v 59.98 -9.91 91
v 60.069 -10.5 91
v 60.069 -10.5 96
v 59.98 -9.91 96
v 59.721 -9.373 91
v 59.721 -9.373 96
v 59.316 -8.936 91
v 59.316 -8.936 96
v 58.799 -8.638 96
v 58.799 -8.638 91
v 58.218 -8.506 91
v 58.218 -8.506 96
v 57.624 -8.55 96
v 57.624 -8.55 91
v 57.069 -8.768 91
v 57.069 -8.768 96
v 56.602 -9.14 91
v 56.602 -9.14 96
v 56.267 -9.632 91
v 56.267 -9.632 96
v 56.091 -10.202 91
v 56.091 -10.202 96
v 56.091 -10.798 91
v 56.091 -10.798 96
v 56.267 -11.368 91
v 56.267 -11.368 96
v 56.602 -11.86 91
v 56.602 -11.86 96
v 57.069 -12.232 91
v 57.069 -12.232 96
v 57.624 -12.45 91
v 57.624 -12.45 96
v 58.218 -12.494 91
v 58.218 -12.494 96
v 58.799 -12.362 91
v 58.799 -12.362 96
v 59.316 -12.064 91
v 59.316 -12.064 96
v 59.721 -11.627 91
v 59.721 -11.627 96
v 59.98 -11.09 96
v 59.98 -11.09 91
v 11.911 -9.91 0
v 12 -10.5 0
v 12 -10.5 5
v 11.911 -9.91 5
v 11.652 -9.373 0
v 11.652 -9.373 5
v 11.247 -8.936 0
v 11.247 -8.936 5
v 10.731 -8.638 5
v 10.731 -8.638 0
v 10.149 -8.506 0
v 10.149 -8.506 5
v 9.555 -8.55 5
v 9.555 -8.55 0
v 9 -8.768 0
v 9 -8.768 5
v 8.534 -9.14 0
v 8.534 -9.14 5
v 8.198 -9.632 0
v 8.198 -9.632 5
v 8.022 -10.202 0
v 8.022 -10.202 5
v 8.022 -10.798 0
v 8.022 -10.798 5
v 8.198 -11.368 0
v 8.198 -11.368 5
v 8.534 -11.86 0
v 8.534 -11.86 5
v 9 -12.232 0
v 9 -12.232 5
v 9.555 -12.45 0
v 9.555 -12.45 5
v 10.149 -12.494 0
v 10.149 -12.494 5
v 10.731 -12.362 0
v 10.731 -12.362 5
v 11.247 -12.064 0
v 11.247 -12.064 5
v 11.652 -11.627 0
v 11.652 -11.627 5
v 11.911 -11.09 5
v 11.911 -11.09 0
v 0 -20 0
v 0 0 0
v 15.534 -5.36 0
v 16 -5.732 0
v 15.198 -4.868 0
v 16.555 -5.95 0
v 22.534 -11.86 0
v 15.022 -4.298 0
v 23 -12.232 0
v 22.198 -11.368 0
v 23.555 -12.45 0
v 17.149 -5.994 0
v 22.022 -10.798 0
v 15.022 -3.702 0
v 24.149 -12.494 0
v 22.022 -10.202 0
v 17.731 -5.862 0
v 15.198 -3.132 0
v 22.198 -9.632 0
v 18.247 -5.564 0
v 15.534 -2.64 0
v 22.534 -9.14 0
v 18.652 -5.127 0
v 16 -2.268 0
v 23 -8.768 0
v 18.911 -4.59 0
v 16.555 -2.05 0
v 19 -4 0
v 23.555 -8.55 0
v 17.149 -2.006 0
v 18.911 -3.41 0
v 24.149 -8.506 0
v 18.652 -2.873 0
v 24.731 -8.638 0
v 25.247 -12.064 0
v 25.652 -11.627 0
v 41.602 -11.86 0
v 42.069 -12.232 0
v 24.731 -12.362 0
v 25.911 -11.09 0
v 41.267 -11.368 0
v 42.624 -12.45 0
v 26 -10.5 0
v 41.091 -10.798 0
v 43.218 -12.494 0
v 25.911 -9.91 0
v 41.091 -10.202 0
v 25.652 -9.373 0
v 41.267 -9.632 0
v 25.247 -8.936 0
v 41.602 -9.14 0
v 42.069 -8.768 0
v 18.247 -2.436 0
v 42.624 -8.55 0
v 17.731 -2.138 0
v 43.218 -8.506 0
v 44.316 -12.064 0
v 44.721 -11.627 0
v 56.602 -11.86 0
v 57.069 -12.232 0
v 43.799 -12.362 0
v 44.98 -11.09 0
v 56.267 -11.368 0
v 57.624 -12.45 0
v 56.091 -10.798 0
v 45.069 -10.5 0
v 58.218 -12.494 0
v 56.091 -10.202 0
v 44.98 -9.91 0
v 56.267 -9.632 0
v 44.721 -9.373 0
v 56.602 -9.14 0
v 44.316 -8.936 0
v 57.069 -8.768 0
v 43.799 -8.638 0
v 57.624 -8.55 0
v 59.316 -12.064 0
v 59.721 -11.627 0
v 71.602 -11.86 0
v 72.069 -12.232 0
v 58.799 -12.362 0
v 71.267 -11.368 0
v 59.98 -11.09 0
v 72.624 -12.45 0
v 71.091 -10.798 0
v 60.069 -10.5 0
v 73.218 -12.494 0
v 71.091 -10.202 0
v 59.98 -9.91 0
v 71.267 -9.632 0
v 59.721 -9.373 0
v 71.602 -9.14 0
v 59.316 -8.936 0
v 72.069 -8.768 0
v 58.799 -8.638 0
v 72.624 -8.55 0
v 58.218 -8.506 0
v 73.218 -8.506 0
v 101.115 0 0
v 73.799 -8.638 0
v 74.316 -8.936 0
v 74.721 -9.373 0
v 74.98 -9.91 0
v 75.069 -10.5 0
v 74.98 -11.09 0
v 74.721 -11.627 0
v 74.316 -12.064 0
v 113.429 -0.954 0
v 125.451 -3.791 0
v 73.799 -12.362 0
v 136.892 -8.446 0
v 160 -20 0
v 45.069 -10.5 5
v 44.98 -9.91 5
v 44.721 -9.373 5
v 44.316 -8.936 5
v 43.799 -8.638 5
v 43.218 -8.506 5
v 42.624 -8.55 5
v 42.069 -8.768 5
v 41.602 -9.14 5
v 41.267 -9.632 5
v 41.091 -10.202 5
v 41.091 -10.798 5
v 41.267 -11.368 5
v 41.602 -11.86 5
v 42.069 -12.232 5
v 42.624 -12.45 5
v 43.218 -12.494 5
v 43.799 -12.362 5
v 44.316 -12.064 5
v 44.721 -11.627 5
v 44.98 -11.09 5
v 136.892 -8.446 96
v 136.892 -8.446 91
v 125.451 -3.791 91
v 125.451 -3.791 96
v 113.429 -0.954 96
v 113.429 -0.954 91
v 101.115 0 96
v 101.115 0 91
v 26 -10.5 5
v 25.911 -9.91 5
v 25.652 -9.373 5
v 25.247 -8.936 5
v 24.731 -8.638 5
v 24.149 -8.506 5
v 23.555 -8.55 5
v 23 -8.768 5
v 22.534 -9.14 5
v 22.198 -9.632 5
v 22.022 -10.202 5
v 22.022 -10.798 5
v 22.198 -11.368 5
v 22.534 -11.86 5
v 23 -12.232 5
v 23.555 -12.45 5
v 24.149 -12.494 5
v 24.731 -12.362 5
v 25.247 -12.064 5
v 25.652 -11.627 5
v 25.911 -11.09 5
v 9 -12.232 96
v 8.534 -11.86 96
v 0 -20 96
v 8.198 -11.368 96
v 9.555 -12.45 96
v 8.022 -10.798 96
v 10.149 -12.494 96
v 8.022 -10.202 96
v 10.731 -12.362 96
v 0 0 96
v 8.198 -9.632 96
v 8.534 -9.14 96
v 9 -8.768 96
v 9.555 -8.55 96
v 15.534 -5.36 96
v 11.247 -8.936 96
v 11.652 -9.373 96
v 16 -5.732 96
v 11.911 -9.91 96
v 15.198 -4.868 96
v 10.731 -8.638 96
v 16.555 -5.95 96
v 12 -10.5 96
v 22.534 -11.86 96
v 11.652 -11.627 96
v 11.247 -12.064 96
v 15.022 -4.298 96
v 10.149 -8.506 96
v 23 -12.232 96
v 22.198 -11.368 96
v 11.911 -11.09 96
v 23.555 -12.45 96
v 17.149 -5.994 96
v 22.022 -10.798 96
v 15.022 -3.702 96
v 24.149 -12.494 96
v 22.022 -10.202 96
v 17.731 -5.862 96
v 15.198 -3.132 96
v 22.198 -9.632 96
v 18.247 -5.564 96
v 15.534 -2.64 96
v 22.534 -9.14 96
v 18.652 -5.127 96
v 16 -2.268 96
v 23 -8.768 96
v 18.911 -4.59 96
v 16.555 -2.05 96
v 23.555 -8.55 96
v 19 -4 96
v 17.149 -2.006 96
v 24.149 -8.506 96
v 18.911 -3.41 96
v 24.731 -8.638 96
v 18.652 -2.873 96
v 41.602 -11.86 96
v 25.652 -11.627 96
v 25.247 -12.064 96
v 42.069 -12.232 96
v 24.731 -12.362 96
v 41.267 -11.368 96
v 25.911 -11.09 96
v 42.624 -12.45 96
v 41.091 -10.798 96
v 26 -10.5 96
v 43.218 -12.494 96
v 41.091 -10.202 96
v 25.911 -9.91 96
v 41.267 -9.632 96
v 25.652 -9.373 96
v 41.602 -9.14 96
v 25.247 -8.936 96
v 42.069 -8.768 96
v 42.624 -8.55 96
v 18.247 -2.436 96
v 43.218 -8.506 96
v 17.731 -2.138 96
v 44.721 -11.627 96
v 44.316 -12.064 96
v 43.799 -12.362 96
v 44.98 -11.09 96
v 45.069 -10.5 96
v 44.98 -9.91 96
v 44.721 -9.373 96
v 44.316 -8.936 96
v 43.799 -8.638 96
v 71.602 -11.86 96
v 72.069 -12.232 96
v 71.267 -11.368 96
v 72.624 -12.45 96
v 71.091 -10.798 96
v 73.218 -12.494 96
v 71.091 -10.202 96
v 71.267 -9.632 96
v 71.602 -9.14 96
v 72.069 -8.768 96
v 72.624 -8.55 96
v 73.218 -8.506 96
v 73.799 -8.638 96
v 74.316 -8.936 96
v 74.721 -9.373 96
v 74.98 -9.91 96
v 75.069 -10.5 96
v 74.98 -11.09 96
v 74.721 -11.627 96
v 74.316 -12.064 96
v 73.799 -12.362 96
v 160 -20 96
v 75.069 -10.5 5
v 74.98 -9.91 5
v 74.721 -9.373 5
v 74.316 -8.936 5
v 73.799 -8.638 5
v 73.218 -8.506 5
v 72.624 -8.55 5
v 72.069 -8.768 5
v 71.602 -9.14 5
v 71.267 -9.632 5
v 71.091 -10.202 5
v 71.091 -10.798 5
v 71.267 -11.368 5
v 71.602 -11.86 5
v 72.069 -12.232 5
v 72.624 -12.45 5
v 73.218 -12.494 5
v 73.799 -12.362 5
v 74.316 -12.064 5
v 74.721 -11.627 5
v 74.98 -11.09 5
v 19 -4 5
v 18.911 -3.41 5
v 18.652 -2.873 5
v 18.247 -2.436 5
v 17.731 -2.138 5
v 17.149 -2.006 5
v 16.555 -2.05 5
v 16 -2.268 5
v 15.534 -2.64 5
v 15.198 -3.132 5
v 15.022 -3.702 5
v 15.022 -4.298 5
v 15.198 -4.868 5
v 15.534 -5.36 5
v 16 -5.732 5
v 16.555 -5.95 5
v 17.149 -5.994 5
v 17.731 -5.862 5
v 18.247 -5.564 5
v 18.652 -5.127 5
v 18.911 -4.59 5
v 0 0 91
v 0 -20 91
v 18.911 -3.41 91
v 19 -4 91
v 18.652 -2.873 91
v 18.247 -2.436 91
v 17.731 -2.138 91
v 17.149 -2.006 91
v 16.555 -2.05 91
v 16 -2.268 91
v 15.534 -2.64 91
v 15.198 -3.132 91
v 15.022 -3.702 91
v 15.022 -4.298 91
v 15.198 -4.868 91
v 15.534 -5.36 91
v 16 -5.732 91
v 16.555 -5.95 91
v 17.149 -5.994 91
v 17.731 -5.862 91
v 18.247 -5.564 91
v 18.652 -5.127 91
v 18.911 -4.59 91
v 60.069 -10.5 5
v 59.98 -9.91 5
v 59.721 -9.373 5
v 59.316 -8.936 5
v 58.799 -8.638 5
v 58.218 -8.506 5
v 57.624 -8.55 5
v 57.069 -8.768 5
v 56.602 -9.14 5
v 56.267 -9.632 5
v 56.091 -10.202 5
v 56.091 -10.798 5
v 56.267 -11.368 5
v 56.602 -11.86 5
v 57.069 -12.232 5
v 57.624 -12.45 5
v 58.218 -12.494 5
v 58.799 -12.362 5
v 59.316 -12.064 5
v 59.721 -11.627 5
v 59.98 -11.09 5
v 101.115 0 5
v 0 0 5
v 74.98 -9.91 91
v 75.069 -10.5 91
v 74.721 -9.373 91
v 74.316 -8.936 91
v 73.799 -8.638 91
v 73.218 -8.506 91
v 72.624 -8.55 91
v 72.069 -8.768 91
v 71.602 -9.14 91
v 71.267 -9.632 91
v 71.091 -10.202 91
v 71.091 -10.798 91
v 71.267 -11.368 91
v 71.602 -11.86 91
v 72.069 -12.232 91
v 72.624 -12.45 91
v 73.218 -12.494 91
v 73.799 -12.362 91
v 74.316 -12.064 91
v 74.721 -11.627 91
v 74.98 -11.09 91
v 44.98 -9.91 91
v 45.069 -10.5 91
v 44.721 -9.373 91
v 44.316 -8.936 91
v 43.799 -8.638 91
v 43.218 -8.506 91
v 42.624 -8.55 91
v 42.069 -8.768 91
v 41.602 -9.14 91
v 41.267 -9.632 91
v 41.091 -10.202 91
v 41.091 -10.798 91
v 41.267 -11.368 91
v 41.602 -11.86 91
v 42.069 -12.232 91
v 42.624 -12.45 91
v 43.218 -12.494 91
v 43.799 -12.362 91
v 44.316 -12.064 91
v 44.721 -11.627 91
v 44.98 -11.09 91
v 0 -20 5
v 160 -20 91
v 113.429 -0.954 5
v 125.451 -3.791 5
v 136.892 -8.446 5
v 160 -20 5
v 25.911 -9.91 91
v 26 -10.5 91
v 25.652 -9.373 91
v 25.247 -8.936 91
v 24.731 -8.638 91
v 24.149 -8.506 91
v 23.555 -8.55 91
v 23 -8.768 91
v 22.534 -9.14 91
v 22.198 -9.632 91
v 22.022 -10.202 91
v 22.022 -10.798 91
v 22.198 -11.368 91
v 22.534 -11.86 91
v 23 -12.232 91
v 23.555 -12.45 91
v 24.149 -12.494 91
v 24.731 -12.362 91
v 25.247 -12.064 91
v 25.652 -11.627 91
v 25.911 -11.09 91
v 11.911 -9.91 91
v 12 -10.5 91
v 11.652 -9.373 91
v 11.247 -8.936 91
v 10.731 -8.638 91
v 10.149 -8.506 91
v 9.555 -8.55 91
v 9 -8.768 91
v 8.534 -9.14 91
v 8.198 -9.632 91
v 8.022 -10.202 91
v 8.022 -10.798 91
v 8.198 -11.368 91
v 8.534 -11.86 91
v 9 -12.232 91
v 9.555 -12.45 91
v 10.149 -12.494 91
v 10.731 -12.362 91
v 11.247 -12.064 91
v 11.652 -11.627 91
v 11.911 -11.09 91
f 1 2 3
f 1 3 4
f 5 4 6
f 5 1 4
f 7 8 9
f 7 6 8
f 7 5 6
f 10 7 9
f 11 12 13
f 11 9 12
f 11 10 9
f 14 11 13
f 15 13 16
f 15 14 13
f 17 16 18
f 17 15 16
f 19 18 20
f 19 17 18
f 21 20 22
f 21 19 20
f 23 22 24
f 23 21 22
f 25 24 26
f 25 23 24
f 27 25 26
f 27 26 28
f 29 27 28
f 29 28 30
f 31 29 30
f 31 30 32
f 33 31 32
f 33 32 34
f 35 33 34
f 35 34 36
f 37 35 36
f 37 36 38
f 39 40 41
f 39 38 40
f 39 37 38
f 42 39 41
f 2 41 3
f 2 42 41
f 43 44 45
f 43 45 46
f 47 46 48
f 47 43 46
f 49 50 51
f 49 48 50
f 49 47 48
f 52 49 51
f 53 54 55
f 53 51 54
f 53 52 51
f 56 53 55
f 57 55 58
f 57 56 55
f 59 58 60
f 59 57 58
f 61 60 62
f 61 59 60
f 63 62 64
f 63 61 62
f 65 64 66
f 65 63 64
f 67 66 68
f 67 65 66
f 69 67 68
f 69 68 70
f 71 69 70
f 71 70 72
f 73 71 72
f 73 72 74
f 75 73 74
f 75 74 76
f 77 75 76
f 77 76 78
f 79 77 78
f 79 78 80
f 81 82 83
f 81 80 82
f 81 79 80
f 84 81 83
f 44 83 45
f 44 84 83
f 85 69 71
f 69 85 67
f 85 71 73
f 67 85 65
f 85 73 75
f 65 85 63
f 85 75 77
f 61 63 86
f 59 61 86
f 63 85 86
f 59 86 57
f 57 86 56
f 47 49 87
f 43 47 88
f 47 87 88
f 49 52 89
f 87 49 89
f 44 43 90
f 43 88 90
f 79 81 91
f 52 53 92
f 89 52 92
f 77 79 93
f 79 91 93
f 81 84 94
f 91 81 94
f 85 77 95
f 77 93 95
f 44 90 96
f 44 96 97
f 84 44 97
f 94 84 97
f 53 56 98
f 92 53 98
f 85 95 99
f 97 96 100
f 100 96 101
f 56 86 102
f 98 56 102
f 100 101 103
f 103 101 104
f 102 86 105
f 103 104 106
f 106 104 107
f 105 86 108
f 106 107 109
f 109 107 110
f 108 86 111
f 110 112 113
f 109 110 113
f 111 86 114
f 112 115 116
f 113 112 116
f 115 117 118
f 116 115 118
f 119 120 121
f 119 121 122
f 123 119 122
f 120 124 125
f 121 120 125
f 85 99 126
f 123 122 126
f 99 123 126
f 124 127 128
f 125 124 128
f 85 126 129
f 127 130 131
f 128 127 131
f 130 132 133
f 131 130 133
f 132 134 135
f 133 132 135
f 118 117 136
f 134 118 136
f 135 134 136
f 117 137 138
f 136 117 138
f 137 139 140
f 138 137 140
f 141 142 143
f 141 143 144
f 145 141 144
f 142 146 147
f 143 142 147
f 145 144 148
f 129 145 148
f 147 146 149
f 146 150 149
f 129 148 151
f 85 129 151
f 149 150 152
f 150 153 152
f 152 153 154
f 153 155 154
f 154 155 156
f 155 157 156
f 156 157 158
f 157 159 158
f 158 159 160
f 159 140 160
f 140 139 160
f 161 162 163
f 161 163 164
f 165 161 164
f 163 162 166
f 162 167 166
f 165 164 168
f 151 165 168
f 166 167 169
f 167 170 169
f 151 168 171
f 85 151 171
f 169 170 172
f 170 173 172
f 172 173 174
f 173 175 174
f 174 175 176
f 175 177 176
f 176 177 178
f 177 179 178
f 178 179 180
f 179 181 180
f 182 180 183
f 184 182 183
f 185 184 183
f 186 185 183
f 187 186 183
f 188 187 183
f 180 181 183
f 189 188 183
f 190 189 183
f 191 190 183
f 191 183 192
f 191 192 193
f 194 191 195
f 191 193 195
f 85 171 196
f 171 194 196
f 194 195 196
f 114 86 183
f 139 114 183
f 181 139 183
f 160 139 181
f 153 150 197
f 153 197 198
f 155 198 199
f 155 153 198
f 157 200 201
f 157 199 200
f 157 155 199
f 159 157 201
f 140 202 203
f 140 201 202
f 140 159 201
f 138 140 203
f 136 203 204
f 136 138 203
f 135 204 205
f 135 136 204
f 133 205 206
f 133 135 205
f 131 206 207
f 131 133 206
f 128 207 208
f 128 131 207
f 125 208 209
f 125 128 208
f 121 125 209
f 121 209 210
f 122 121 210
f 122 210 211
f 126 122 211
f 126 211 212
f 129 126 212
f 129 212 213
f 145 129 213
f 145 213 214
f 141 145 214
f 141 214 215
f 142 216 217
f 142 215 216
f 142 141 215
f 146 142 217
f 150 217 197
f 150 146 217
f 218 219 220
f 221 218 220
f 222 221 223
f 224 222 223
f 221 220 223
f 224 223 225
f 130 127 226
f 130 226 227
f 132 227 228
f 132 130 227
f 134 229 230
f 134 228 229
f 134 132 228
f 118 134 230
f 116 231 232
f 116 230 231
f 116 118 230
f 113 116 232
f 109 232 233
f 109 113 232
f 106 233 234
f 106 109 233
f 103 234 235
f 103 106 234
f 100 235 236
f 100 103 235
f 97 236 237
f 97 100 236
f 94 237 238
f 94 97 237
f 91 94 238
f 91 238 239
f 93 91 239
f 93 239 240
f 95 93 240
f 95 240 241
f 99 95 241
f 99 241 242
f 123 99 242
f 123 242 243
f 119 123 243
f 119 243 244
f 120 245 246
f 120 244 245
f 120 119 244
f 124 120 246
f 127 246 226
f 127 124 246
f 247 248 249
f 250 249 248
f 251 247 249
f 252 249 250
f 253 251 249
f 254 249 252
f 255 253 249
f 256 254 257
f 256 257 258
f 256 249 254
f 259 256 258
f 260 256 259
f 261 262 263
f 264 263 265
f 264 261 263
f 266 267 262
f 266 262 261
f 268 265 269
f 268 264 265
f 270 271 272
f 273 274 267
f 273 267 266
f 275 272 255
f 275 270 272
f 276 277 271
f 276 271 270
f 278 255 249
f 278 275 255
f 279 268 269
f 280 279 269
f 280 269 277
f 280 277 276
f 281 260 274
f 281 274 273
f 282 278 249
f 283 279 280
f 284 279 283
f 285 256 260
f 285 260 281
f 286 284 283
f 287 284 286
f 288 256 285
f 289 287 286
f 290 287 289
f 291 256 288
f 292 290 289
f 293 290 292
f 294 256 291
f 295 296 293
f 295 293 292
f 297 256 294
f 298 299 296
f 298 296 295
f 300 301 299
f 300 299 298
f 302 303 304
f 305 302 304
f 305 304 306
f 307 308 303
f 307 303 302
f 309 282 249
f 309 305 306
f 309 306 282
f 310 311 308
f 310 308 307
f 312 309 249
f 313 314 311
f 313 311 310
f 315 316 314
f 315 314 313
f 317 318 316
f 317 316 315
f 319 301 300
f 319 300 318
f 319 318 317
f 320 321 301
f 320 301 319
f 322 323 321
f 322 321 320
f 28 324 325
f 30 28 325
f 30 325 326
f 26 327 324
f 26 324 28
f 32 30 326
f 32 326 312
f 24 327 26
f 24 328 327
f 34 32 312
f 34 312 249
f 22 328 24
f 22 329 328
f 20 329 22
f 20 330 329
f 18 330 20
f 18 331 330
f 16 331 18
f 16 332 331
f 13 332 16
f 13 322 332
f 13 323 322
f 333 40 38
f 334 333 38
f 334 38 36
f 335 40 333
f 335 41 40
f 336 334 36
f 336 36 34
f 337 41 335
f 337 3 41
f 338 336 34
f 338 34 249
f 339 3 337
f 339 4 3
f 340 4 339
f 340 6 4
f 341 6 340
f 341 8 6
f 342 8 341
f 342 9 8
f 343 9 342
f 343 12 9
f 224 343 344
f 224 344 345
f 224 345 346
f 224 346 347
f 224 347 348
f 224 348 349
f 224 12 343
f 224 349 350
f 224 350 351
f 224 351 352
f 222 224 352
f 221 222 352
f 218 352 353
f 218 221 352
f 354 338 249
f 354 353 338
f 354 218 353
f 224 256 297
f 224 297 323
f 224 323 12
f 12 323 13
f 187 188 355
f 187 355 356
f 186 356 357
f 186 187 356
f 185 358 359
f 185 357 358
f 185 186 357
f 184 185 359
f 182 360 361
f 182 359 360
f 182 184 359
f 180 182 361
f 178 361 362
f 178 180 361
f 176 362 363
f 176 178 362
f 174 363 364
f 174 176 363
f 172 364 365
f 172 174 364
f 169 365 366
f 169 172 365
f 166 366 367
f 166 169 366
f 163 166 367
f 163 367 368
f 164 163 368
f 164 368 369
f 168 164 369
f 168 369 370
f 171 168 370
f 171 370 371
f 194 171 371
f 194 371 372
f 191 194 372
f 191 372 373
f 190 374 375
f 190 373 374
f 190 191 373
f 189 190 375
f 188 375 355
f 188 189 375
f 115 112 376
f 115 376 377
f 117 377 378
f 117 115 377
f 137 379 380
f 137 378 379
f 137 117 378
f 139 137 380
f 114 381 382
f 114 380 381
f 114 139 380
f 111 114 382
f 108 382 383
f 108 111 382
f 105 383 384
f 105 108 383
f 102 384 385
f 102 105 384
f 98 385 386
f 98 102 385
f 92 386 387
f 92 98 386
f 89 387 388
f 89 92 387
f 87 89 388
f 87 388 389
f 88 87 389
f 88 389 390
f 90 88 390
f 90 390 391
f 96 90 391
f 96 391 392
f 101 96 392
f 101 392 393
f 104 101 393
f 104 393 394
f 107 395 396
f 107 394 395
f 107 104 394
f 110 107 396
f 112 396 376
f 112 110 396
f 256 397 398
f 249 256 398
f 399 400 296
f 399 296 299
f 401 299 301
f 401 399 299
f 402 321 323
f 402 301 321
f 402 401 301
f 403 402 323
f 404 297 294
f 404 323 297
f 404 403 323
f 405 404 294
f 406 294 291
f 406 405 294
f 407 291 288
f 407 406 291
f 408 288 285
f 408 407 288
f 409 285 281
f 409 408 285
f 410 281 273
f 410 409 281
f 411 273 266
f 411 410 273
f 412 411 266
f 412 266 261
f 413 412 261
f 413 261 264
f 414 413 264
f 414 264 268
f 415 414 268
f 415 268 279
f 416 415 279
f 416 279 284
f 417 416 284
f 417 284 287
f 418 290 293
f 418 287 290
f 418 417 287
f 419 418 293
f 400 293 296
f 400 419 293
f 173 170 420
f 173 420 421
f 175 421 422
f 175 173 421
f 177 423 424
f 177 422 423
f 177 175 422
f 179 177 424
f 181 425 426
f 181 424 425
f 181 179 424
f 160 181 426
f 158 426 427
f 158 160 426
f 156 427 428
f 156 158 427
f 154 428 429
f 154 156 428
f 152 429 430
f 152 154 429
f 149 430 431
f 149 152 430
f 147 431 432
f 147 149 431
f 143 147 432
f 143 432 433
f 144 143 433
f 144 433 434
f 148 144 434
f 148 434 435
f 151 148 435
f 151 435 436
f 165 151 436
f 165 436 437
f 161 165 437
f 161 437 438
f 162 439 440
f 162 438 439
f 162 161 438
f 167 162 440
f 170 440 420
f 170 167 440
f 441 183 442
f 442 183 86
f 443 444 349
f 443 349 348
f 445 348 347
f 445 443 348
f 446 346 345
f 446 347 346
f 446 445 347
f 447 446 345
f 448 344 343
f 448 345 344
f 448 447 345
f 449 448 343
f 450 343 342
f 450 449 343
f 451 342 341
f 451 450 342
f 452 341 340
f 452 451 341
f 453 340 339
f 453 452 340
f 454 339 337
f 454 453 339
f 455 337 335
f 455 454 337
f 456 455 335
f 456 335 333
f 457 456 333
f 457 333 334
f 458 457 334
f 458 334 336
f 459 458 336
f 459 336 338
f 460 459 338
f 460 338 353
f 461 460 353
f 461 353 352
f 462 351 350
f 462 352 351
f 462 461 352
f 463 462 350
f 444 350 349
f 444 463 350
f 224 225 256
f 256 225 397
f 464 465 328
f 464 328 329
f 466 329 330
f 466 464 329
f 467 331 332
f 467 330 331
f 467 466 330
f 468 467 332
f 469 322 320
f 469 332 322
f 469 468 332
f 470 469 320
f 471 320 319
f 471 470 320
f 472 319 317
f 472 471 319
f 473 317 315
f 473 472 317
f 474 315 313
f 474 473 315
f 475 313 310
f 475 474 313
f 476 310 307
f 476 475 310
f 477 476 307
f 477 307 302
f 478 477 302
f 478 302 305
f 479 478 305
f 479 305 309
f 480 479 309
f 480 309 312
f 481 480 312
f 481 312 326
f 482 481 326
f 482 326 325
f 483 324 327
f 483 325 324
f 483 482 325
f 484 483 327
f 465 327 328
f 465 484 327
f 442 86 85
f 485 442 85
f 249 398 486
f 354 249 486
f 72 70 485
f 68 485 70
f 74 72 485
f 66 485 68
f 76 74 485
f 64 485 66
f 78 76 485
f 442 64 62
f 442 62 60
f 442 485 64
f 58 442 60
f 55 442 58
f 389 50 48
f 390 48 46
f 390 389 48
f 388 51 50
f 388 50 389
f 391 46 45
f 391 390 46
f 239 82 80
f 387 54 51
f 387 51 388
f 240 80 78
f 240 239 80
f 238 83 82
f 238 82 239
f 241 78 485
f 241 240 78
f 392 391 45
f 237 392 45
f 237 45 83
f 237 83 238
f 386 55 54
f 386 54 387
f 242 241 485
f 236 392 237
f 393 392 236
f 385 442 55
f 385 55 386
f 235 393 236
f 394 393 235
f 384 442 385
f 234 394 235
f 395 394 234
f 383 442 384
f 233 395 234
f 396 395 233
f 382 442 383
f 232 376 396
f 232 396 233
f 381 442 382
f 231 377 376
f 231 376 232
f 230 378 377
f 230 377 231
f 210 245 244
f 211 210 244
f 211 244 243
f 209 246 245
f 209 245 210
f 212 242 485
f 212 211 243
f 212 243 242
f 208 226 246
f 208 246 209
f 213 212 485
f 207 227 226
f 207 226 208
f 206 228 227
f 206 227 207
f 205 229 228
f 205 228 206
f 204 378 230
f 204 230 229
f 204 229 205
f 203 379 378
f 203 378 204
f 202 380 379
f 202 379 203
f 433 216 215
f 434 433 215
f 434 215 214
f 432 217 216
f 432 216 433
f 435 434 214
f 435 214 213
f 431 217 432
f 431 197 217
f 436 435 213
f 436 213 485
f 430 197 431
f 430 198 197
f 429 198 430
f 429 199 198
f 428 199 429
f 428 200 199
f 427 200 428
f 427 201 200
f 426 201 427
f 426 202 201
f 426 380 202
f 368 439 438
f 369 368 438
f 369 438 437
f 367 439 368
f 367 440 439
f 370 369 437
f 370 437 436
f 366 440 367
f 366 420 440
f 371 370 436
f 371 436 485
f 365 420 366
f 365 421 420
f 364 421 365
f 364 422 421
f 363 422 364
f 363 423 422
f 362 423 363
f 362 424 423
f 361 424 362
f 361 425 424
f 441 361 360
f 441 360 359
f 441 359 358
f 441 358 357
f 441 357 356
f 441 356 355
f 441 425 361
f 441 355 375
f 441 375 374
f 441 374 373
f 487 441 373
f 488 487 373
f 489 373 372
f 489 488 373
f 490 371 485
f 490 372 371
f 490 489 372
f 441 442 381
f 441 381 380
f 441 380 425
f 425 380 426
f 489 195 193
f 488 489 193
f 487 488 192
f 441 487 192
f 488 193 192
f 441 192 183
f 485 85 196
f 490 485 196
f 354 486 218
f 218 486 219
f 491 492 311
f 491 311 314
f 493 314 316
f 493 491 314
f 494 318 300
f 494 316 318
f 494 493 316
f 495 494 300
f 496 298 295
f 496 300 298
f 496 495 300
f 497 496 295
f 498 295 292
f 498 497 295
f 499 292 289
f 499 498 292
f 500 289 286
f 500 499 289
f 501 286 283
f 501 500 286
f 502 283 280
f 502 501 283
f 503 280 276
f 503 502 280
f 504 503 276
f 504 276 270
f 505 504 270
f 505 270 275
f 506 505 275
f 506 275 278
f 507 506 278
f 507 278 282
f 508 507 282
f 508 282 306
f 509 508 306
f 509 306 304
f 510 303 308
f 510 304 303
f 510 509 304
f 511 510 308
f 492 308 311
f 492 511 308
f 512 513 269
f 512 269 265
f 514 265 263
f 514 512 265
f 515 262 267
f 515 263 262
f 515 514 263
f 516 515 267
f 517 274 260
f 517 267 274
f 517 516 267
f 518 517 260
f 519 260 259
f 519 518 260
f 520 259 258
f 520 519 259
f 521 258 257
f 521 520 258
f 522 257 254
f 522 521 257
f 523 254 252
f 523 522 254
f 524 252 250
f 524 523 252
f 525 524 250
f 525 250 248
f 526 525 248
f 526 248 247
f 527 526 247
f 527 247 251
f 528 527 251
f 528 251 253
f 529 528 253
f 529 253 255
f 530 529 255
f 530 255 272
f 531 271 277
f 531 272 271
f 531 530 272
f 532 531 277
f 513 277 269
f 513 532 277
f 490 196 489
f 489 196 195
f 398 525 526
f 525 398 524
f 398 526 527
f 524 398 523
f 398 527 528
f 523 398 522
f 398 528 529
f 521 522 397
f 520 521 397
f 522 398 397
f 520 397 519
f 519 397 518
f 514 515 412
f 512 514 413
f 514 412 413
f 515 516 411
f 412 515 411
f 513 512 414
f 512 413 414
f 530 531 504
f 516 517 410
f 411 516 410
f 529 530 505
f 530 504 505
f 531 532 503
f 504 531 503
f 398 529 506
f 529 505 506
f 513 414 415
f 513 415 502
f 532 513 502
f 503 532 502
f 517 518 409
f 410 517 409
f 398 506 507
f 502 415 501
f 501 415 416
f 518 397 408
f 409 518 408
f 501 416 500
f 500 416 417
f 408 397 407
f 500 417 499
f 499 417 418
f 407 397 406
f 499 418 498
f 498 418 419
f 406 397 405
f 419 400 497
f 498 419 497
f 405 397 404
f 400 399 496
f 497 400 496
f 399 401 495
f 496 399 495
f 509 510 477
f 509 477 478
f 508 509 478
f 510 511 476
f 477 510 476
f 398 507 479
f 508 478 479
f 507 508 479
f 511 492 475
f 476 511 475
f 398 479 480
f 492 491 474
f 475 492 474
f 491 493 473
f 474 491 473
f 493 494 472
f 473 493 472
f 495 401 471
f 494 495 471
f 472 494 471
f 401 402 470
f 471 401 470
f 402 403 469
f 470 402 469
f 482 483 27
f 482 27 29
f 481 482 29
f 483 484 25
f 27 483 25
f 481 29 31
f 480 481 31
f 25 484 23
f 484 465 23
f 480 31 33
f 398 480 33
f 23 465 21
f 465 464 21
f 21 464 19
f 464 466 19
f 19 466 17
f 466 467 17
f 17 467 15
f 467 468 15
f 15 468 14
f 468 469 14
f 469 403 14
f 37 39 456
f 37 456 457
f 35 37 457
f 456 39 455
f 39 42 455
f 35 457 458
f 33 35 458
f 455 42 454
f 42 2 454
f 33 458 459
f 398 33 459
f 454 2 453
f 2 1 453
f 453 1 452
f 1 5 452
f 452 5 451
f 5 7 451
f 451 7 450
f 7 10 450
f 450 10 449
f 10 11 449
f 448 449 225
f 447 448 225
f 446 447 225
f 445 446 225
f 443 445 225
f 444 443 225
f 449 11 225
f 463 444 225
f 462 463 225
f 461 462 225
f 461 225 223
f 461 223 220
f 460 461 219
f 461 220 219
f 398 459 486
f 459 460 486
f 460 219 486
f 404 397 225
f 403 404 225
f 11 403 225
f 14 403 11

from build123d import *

# Parameters (mm, degrees)
BOSS_EXTRUDE1_START     = 91
BOSS_EXTRUDE1_DEPTH     = 5
BOSS_EXTRUDE2_DEPTH     = 5
CUT_EXTRUDE1_DEPTH      = 186.151289491
CUT_EXTRUDE1_DEPTH_BACK = 186.151289491
SKETCH3_R               = 2


with BuildPart() as part:
    # Sketch2 → Boss-Extrude1 (new body)
    with BuildSketch(Plane.XY.offset(BOSS_EXTRUDE1_START)):
        with BuildLine():
            Line((0, 0), (0, -20))
            Line((0, -20), (160, -20))
            Line((160, -20), (136.89164944, -8.44582472))
            ThreePointArc((136.89164944, -8.44582472), (119.494795444, -2.140080843), (101.1145618, 0))
            Line((101.1145618, 0), (0, 0))
        make_face()
    extrude(amount=BOSS_EXTRUDE1_DEPTH)


with BuildPart() as body_2:
    # Sketch2<2> → Boss-Extrude2 (new body)
    with BuildSketch(Plane.XY):
        with BuildLine():
            Line((0, 0), (0, -20))
            Line((0, -20), (160, -20))
            Line((160, -20), (136.89164944, -8.44582472))
            ThreePointArc((136.89164944, -8.44582472), (119.494795444, -2.140080843), (101.1145618, 0))
            Line((101.1145618, 0), (0, 0))
        make_face()
    extrude(amount=BOSS_EXTRUDE2_DEPTH)


with BuildPart() as cut_extrude1_tool:
    # Sketch3 → Cut-Extrude1 (new, two sides: drawn at the far end of the back side and taken through both)
    with BuildSketch(Plane.XY.offset(5).offset(-CUT_EXTRUDE1_DEPTH_BACK)):
        with Locations((10, -10.5)):
            Circle(SKETCH3_R)
        with Locations((17, -4)):
            Circle(SKETCH3_R)
        with Locations((24, -10.5)):
            Circle(SKETCH3_R)
        with Locations((43.06859969, -10.5)):
            Circle(SKETCH3_R)
        with Locations((58.06859969, -10.5)):
            Circle(SKETCH3_R)
        with Locations((73.06859969, -10.5)):
            Circle(SKETCH3_R)
    extrude(amount=CUT_EXTRUDE1_DEPTH + CUT_EXTRUDE1_DEPTH_BACK)


with BuildPart() as part_1:
    add(part.part)

    # Cut-Extrude1: cut by cut_extrude1_tool
    add(cut_extrude1_tool.part, mode=Mode.SUBTRACT)


with BuildPart() as body_2_1:
    add(body_2.part)

    # Cut-Extrude1: cut by cut_extrude1_tool
    add(cut_extrude1_tool.part, mode=Mode.SUBTRACT)


solid = Compound([part_1.part, body_2_1.part])
